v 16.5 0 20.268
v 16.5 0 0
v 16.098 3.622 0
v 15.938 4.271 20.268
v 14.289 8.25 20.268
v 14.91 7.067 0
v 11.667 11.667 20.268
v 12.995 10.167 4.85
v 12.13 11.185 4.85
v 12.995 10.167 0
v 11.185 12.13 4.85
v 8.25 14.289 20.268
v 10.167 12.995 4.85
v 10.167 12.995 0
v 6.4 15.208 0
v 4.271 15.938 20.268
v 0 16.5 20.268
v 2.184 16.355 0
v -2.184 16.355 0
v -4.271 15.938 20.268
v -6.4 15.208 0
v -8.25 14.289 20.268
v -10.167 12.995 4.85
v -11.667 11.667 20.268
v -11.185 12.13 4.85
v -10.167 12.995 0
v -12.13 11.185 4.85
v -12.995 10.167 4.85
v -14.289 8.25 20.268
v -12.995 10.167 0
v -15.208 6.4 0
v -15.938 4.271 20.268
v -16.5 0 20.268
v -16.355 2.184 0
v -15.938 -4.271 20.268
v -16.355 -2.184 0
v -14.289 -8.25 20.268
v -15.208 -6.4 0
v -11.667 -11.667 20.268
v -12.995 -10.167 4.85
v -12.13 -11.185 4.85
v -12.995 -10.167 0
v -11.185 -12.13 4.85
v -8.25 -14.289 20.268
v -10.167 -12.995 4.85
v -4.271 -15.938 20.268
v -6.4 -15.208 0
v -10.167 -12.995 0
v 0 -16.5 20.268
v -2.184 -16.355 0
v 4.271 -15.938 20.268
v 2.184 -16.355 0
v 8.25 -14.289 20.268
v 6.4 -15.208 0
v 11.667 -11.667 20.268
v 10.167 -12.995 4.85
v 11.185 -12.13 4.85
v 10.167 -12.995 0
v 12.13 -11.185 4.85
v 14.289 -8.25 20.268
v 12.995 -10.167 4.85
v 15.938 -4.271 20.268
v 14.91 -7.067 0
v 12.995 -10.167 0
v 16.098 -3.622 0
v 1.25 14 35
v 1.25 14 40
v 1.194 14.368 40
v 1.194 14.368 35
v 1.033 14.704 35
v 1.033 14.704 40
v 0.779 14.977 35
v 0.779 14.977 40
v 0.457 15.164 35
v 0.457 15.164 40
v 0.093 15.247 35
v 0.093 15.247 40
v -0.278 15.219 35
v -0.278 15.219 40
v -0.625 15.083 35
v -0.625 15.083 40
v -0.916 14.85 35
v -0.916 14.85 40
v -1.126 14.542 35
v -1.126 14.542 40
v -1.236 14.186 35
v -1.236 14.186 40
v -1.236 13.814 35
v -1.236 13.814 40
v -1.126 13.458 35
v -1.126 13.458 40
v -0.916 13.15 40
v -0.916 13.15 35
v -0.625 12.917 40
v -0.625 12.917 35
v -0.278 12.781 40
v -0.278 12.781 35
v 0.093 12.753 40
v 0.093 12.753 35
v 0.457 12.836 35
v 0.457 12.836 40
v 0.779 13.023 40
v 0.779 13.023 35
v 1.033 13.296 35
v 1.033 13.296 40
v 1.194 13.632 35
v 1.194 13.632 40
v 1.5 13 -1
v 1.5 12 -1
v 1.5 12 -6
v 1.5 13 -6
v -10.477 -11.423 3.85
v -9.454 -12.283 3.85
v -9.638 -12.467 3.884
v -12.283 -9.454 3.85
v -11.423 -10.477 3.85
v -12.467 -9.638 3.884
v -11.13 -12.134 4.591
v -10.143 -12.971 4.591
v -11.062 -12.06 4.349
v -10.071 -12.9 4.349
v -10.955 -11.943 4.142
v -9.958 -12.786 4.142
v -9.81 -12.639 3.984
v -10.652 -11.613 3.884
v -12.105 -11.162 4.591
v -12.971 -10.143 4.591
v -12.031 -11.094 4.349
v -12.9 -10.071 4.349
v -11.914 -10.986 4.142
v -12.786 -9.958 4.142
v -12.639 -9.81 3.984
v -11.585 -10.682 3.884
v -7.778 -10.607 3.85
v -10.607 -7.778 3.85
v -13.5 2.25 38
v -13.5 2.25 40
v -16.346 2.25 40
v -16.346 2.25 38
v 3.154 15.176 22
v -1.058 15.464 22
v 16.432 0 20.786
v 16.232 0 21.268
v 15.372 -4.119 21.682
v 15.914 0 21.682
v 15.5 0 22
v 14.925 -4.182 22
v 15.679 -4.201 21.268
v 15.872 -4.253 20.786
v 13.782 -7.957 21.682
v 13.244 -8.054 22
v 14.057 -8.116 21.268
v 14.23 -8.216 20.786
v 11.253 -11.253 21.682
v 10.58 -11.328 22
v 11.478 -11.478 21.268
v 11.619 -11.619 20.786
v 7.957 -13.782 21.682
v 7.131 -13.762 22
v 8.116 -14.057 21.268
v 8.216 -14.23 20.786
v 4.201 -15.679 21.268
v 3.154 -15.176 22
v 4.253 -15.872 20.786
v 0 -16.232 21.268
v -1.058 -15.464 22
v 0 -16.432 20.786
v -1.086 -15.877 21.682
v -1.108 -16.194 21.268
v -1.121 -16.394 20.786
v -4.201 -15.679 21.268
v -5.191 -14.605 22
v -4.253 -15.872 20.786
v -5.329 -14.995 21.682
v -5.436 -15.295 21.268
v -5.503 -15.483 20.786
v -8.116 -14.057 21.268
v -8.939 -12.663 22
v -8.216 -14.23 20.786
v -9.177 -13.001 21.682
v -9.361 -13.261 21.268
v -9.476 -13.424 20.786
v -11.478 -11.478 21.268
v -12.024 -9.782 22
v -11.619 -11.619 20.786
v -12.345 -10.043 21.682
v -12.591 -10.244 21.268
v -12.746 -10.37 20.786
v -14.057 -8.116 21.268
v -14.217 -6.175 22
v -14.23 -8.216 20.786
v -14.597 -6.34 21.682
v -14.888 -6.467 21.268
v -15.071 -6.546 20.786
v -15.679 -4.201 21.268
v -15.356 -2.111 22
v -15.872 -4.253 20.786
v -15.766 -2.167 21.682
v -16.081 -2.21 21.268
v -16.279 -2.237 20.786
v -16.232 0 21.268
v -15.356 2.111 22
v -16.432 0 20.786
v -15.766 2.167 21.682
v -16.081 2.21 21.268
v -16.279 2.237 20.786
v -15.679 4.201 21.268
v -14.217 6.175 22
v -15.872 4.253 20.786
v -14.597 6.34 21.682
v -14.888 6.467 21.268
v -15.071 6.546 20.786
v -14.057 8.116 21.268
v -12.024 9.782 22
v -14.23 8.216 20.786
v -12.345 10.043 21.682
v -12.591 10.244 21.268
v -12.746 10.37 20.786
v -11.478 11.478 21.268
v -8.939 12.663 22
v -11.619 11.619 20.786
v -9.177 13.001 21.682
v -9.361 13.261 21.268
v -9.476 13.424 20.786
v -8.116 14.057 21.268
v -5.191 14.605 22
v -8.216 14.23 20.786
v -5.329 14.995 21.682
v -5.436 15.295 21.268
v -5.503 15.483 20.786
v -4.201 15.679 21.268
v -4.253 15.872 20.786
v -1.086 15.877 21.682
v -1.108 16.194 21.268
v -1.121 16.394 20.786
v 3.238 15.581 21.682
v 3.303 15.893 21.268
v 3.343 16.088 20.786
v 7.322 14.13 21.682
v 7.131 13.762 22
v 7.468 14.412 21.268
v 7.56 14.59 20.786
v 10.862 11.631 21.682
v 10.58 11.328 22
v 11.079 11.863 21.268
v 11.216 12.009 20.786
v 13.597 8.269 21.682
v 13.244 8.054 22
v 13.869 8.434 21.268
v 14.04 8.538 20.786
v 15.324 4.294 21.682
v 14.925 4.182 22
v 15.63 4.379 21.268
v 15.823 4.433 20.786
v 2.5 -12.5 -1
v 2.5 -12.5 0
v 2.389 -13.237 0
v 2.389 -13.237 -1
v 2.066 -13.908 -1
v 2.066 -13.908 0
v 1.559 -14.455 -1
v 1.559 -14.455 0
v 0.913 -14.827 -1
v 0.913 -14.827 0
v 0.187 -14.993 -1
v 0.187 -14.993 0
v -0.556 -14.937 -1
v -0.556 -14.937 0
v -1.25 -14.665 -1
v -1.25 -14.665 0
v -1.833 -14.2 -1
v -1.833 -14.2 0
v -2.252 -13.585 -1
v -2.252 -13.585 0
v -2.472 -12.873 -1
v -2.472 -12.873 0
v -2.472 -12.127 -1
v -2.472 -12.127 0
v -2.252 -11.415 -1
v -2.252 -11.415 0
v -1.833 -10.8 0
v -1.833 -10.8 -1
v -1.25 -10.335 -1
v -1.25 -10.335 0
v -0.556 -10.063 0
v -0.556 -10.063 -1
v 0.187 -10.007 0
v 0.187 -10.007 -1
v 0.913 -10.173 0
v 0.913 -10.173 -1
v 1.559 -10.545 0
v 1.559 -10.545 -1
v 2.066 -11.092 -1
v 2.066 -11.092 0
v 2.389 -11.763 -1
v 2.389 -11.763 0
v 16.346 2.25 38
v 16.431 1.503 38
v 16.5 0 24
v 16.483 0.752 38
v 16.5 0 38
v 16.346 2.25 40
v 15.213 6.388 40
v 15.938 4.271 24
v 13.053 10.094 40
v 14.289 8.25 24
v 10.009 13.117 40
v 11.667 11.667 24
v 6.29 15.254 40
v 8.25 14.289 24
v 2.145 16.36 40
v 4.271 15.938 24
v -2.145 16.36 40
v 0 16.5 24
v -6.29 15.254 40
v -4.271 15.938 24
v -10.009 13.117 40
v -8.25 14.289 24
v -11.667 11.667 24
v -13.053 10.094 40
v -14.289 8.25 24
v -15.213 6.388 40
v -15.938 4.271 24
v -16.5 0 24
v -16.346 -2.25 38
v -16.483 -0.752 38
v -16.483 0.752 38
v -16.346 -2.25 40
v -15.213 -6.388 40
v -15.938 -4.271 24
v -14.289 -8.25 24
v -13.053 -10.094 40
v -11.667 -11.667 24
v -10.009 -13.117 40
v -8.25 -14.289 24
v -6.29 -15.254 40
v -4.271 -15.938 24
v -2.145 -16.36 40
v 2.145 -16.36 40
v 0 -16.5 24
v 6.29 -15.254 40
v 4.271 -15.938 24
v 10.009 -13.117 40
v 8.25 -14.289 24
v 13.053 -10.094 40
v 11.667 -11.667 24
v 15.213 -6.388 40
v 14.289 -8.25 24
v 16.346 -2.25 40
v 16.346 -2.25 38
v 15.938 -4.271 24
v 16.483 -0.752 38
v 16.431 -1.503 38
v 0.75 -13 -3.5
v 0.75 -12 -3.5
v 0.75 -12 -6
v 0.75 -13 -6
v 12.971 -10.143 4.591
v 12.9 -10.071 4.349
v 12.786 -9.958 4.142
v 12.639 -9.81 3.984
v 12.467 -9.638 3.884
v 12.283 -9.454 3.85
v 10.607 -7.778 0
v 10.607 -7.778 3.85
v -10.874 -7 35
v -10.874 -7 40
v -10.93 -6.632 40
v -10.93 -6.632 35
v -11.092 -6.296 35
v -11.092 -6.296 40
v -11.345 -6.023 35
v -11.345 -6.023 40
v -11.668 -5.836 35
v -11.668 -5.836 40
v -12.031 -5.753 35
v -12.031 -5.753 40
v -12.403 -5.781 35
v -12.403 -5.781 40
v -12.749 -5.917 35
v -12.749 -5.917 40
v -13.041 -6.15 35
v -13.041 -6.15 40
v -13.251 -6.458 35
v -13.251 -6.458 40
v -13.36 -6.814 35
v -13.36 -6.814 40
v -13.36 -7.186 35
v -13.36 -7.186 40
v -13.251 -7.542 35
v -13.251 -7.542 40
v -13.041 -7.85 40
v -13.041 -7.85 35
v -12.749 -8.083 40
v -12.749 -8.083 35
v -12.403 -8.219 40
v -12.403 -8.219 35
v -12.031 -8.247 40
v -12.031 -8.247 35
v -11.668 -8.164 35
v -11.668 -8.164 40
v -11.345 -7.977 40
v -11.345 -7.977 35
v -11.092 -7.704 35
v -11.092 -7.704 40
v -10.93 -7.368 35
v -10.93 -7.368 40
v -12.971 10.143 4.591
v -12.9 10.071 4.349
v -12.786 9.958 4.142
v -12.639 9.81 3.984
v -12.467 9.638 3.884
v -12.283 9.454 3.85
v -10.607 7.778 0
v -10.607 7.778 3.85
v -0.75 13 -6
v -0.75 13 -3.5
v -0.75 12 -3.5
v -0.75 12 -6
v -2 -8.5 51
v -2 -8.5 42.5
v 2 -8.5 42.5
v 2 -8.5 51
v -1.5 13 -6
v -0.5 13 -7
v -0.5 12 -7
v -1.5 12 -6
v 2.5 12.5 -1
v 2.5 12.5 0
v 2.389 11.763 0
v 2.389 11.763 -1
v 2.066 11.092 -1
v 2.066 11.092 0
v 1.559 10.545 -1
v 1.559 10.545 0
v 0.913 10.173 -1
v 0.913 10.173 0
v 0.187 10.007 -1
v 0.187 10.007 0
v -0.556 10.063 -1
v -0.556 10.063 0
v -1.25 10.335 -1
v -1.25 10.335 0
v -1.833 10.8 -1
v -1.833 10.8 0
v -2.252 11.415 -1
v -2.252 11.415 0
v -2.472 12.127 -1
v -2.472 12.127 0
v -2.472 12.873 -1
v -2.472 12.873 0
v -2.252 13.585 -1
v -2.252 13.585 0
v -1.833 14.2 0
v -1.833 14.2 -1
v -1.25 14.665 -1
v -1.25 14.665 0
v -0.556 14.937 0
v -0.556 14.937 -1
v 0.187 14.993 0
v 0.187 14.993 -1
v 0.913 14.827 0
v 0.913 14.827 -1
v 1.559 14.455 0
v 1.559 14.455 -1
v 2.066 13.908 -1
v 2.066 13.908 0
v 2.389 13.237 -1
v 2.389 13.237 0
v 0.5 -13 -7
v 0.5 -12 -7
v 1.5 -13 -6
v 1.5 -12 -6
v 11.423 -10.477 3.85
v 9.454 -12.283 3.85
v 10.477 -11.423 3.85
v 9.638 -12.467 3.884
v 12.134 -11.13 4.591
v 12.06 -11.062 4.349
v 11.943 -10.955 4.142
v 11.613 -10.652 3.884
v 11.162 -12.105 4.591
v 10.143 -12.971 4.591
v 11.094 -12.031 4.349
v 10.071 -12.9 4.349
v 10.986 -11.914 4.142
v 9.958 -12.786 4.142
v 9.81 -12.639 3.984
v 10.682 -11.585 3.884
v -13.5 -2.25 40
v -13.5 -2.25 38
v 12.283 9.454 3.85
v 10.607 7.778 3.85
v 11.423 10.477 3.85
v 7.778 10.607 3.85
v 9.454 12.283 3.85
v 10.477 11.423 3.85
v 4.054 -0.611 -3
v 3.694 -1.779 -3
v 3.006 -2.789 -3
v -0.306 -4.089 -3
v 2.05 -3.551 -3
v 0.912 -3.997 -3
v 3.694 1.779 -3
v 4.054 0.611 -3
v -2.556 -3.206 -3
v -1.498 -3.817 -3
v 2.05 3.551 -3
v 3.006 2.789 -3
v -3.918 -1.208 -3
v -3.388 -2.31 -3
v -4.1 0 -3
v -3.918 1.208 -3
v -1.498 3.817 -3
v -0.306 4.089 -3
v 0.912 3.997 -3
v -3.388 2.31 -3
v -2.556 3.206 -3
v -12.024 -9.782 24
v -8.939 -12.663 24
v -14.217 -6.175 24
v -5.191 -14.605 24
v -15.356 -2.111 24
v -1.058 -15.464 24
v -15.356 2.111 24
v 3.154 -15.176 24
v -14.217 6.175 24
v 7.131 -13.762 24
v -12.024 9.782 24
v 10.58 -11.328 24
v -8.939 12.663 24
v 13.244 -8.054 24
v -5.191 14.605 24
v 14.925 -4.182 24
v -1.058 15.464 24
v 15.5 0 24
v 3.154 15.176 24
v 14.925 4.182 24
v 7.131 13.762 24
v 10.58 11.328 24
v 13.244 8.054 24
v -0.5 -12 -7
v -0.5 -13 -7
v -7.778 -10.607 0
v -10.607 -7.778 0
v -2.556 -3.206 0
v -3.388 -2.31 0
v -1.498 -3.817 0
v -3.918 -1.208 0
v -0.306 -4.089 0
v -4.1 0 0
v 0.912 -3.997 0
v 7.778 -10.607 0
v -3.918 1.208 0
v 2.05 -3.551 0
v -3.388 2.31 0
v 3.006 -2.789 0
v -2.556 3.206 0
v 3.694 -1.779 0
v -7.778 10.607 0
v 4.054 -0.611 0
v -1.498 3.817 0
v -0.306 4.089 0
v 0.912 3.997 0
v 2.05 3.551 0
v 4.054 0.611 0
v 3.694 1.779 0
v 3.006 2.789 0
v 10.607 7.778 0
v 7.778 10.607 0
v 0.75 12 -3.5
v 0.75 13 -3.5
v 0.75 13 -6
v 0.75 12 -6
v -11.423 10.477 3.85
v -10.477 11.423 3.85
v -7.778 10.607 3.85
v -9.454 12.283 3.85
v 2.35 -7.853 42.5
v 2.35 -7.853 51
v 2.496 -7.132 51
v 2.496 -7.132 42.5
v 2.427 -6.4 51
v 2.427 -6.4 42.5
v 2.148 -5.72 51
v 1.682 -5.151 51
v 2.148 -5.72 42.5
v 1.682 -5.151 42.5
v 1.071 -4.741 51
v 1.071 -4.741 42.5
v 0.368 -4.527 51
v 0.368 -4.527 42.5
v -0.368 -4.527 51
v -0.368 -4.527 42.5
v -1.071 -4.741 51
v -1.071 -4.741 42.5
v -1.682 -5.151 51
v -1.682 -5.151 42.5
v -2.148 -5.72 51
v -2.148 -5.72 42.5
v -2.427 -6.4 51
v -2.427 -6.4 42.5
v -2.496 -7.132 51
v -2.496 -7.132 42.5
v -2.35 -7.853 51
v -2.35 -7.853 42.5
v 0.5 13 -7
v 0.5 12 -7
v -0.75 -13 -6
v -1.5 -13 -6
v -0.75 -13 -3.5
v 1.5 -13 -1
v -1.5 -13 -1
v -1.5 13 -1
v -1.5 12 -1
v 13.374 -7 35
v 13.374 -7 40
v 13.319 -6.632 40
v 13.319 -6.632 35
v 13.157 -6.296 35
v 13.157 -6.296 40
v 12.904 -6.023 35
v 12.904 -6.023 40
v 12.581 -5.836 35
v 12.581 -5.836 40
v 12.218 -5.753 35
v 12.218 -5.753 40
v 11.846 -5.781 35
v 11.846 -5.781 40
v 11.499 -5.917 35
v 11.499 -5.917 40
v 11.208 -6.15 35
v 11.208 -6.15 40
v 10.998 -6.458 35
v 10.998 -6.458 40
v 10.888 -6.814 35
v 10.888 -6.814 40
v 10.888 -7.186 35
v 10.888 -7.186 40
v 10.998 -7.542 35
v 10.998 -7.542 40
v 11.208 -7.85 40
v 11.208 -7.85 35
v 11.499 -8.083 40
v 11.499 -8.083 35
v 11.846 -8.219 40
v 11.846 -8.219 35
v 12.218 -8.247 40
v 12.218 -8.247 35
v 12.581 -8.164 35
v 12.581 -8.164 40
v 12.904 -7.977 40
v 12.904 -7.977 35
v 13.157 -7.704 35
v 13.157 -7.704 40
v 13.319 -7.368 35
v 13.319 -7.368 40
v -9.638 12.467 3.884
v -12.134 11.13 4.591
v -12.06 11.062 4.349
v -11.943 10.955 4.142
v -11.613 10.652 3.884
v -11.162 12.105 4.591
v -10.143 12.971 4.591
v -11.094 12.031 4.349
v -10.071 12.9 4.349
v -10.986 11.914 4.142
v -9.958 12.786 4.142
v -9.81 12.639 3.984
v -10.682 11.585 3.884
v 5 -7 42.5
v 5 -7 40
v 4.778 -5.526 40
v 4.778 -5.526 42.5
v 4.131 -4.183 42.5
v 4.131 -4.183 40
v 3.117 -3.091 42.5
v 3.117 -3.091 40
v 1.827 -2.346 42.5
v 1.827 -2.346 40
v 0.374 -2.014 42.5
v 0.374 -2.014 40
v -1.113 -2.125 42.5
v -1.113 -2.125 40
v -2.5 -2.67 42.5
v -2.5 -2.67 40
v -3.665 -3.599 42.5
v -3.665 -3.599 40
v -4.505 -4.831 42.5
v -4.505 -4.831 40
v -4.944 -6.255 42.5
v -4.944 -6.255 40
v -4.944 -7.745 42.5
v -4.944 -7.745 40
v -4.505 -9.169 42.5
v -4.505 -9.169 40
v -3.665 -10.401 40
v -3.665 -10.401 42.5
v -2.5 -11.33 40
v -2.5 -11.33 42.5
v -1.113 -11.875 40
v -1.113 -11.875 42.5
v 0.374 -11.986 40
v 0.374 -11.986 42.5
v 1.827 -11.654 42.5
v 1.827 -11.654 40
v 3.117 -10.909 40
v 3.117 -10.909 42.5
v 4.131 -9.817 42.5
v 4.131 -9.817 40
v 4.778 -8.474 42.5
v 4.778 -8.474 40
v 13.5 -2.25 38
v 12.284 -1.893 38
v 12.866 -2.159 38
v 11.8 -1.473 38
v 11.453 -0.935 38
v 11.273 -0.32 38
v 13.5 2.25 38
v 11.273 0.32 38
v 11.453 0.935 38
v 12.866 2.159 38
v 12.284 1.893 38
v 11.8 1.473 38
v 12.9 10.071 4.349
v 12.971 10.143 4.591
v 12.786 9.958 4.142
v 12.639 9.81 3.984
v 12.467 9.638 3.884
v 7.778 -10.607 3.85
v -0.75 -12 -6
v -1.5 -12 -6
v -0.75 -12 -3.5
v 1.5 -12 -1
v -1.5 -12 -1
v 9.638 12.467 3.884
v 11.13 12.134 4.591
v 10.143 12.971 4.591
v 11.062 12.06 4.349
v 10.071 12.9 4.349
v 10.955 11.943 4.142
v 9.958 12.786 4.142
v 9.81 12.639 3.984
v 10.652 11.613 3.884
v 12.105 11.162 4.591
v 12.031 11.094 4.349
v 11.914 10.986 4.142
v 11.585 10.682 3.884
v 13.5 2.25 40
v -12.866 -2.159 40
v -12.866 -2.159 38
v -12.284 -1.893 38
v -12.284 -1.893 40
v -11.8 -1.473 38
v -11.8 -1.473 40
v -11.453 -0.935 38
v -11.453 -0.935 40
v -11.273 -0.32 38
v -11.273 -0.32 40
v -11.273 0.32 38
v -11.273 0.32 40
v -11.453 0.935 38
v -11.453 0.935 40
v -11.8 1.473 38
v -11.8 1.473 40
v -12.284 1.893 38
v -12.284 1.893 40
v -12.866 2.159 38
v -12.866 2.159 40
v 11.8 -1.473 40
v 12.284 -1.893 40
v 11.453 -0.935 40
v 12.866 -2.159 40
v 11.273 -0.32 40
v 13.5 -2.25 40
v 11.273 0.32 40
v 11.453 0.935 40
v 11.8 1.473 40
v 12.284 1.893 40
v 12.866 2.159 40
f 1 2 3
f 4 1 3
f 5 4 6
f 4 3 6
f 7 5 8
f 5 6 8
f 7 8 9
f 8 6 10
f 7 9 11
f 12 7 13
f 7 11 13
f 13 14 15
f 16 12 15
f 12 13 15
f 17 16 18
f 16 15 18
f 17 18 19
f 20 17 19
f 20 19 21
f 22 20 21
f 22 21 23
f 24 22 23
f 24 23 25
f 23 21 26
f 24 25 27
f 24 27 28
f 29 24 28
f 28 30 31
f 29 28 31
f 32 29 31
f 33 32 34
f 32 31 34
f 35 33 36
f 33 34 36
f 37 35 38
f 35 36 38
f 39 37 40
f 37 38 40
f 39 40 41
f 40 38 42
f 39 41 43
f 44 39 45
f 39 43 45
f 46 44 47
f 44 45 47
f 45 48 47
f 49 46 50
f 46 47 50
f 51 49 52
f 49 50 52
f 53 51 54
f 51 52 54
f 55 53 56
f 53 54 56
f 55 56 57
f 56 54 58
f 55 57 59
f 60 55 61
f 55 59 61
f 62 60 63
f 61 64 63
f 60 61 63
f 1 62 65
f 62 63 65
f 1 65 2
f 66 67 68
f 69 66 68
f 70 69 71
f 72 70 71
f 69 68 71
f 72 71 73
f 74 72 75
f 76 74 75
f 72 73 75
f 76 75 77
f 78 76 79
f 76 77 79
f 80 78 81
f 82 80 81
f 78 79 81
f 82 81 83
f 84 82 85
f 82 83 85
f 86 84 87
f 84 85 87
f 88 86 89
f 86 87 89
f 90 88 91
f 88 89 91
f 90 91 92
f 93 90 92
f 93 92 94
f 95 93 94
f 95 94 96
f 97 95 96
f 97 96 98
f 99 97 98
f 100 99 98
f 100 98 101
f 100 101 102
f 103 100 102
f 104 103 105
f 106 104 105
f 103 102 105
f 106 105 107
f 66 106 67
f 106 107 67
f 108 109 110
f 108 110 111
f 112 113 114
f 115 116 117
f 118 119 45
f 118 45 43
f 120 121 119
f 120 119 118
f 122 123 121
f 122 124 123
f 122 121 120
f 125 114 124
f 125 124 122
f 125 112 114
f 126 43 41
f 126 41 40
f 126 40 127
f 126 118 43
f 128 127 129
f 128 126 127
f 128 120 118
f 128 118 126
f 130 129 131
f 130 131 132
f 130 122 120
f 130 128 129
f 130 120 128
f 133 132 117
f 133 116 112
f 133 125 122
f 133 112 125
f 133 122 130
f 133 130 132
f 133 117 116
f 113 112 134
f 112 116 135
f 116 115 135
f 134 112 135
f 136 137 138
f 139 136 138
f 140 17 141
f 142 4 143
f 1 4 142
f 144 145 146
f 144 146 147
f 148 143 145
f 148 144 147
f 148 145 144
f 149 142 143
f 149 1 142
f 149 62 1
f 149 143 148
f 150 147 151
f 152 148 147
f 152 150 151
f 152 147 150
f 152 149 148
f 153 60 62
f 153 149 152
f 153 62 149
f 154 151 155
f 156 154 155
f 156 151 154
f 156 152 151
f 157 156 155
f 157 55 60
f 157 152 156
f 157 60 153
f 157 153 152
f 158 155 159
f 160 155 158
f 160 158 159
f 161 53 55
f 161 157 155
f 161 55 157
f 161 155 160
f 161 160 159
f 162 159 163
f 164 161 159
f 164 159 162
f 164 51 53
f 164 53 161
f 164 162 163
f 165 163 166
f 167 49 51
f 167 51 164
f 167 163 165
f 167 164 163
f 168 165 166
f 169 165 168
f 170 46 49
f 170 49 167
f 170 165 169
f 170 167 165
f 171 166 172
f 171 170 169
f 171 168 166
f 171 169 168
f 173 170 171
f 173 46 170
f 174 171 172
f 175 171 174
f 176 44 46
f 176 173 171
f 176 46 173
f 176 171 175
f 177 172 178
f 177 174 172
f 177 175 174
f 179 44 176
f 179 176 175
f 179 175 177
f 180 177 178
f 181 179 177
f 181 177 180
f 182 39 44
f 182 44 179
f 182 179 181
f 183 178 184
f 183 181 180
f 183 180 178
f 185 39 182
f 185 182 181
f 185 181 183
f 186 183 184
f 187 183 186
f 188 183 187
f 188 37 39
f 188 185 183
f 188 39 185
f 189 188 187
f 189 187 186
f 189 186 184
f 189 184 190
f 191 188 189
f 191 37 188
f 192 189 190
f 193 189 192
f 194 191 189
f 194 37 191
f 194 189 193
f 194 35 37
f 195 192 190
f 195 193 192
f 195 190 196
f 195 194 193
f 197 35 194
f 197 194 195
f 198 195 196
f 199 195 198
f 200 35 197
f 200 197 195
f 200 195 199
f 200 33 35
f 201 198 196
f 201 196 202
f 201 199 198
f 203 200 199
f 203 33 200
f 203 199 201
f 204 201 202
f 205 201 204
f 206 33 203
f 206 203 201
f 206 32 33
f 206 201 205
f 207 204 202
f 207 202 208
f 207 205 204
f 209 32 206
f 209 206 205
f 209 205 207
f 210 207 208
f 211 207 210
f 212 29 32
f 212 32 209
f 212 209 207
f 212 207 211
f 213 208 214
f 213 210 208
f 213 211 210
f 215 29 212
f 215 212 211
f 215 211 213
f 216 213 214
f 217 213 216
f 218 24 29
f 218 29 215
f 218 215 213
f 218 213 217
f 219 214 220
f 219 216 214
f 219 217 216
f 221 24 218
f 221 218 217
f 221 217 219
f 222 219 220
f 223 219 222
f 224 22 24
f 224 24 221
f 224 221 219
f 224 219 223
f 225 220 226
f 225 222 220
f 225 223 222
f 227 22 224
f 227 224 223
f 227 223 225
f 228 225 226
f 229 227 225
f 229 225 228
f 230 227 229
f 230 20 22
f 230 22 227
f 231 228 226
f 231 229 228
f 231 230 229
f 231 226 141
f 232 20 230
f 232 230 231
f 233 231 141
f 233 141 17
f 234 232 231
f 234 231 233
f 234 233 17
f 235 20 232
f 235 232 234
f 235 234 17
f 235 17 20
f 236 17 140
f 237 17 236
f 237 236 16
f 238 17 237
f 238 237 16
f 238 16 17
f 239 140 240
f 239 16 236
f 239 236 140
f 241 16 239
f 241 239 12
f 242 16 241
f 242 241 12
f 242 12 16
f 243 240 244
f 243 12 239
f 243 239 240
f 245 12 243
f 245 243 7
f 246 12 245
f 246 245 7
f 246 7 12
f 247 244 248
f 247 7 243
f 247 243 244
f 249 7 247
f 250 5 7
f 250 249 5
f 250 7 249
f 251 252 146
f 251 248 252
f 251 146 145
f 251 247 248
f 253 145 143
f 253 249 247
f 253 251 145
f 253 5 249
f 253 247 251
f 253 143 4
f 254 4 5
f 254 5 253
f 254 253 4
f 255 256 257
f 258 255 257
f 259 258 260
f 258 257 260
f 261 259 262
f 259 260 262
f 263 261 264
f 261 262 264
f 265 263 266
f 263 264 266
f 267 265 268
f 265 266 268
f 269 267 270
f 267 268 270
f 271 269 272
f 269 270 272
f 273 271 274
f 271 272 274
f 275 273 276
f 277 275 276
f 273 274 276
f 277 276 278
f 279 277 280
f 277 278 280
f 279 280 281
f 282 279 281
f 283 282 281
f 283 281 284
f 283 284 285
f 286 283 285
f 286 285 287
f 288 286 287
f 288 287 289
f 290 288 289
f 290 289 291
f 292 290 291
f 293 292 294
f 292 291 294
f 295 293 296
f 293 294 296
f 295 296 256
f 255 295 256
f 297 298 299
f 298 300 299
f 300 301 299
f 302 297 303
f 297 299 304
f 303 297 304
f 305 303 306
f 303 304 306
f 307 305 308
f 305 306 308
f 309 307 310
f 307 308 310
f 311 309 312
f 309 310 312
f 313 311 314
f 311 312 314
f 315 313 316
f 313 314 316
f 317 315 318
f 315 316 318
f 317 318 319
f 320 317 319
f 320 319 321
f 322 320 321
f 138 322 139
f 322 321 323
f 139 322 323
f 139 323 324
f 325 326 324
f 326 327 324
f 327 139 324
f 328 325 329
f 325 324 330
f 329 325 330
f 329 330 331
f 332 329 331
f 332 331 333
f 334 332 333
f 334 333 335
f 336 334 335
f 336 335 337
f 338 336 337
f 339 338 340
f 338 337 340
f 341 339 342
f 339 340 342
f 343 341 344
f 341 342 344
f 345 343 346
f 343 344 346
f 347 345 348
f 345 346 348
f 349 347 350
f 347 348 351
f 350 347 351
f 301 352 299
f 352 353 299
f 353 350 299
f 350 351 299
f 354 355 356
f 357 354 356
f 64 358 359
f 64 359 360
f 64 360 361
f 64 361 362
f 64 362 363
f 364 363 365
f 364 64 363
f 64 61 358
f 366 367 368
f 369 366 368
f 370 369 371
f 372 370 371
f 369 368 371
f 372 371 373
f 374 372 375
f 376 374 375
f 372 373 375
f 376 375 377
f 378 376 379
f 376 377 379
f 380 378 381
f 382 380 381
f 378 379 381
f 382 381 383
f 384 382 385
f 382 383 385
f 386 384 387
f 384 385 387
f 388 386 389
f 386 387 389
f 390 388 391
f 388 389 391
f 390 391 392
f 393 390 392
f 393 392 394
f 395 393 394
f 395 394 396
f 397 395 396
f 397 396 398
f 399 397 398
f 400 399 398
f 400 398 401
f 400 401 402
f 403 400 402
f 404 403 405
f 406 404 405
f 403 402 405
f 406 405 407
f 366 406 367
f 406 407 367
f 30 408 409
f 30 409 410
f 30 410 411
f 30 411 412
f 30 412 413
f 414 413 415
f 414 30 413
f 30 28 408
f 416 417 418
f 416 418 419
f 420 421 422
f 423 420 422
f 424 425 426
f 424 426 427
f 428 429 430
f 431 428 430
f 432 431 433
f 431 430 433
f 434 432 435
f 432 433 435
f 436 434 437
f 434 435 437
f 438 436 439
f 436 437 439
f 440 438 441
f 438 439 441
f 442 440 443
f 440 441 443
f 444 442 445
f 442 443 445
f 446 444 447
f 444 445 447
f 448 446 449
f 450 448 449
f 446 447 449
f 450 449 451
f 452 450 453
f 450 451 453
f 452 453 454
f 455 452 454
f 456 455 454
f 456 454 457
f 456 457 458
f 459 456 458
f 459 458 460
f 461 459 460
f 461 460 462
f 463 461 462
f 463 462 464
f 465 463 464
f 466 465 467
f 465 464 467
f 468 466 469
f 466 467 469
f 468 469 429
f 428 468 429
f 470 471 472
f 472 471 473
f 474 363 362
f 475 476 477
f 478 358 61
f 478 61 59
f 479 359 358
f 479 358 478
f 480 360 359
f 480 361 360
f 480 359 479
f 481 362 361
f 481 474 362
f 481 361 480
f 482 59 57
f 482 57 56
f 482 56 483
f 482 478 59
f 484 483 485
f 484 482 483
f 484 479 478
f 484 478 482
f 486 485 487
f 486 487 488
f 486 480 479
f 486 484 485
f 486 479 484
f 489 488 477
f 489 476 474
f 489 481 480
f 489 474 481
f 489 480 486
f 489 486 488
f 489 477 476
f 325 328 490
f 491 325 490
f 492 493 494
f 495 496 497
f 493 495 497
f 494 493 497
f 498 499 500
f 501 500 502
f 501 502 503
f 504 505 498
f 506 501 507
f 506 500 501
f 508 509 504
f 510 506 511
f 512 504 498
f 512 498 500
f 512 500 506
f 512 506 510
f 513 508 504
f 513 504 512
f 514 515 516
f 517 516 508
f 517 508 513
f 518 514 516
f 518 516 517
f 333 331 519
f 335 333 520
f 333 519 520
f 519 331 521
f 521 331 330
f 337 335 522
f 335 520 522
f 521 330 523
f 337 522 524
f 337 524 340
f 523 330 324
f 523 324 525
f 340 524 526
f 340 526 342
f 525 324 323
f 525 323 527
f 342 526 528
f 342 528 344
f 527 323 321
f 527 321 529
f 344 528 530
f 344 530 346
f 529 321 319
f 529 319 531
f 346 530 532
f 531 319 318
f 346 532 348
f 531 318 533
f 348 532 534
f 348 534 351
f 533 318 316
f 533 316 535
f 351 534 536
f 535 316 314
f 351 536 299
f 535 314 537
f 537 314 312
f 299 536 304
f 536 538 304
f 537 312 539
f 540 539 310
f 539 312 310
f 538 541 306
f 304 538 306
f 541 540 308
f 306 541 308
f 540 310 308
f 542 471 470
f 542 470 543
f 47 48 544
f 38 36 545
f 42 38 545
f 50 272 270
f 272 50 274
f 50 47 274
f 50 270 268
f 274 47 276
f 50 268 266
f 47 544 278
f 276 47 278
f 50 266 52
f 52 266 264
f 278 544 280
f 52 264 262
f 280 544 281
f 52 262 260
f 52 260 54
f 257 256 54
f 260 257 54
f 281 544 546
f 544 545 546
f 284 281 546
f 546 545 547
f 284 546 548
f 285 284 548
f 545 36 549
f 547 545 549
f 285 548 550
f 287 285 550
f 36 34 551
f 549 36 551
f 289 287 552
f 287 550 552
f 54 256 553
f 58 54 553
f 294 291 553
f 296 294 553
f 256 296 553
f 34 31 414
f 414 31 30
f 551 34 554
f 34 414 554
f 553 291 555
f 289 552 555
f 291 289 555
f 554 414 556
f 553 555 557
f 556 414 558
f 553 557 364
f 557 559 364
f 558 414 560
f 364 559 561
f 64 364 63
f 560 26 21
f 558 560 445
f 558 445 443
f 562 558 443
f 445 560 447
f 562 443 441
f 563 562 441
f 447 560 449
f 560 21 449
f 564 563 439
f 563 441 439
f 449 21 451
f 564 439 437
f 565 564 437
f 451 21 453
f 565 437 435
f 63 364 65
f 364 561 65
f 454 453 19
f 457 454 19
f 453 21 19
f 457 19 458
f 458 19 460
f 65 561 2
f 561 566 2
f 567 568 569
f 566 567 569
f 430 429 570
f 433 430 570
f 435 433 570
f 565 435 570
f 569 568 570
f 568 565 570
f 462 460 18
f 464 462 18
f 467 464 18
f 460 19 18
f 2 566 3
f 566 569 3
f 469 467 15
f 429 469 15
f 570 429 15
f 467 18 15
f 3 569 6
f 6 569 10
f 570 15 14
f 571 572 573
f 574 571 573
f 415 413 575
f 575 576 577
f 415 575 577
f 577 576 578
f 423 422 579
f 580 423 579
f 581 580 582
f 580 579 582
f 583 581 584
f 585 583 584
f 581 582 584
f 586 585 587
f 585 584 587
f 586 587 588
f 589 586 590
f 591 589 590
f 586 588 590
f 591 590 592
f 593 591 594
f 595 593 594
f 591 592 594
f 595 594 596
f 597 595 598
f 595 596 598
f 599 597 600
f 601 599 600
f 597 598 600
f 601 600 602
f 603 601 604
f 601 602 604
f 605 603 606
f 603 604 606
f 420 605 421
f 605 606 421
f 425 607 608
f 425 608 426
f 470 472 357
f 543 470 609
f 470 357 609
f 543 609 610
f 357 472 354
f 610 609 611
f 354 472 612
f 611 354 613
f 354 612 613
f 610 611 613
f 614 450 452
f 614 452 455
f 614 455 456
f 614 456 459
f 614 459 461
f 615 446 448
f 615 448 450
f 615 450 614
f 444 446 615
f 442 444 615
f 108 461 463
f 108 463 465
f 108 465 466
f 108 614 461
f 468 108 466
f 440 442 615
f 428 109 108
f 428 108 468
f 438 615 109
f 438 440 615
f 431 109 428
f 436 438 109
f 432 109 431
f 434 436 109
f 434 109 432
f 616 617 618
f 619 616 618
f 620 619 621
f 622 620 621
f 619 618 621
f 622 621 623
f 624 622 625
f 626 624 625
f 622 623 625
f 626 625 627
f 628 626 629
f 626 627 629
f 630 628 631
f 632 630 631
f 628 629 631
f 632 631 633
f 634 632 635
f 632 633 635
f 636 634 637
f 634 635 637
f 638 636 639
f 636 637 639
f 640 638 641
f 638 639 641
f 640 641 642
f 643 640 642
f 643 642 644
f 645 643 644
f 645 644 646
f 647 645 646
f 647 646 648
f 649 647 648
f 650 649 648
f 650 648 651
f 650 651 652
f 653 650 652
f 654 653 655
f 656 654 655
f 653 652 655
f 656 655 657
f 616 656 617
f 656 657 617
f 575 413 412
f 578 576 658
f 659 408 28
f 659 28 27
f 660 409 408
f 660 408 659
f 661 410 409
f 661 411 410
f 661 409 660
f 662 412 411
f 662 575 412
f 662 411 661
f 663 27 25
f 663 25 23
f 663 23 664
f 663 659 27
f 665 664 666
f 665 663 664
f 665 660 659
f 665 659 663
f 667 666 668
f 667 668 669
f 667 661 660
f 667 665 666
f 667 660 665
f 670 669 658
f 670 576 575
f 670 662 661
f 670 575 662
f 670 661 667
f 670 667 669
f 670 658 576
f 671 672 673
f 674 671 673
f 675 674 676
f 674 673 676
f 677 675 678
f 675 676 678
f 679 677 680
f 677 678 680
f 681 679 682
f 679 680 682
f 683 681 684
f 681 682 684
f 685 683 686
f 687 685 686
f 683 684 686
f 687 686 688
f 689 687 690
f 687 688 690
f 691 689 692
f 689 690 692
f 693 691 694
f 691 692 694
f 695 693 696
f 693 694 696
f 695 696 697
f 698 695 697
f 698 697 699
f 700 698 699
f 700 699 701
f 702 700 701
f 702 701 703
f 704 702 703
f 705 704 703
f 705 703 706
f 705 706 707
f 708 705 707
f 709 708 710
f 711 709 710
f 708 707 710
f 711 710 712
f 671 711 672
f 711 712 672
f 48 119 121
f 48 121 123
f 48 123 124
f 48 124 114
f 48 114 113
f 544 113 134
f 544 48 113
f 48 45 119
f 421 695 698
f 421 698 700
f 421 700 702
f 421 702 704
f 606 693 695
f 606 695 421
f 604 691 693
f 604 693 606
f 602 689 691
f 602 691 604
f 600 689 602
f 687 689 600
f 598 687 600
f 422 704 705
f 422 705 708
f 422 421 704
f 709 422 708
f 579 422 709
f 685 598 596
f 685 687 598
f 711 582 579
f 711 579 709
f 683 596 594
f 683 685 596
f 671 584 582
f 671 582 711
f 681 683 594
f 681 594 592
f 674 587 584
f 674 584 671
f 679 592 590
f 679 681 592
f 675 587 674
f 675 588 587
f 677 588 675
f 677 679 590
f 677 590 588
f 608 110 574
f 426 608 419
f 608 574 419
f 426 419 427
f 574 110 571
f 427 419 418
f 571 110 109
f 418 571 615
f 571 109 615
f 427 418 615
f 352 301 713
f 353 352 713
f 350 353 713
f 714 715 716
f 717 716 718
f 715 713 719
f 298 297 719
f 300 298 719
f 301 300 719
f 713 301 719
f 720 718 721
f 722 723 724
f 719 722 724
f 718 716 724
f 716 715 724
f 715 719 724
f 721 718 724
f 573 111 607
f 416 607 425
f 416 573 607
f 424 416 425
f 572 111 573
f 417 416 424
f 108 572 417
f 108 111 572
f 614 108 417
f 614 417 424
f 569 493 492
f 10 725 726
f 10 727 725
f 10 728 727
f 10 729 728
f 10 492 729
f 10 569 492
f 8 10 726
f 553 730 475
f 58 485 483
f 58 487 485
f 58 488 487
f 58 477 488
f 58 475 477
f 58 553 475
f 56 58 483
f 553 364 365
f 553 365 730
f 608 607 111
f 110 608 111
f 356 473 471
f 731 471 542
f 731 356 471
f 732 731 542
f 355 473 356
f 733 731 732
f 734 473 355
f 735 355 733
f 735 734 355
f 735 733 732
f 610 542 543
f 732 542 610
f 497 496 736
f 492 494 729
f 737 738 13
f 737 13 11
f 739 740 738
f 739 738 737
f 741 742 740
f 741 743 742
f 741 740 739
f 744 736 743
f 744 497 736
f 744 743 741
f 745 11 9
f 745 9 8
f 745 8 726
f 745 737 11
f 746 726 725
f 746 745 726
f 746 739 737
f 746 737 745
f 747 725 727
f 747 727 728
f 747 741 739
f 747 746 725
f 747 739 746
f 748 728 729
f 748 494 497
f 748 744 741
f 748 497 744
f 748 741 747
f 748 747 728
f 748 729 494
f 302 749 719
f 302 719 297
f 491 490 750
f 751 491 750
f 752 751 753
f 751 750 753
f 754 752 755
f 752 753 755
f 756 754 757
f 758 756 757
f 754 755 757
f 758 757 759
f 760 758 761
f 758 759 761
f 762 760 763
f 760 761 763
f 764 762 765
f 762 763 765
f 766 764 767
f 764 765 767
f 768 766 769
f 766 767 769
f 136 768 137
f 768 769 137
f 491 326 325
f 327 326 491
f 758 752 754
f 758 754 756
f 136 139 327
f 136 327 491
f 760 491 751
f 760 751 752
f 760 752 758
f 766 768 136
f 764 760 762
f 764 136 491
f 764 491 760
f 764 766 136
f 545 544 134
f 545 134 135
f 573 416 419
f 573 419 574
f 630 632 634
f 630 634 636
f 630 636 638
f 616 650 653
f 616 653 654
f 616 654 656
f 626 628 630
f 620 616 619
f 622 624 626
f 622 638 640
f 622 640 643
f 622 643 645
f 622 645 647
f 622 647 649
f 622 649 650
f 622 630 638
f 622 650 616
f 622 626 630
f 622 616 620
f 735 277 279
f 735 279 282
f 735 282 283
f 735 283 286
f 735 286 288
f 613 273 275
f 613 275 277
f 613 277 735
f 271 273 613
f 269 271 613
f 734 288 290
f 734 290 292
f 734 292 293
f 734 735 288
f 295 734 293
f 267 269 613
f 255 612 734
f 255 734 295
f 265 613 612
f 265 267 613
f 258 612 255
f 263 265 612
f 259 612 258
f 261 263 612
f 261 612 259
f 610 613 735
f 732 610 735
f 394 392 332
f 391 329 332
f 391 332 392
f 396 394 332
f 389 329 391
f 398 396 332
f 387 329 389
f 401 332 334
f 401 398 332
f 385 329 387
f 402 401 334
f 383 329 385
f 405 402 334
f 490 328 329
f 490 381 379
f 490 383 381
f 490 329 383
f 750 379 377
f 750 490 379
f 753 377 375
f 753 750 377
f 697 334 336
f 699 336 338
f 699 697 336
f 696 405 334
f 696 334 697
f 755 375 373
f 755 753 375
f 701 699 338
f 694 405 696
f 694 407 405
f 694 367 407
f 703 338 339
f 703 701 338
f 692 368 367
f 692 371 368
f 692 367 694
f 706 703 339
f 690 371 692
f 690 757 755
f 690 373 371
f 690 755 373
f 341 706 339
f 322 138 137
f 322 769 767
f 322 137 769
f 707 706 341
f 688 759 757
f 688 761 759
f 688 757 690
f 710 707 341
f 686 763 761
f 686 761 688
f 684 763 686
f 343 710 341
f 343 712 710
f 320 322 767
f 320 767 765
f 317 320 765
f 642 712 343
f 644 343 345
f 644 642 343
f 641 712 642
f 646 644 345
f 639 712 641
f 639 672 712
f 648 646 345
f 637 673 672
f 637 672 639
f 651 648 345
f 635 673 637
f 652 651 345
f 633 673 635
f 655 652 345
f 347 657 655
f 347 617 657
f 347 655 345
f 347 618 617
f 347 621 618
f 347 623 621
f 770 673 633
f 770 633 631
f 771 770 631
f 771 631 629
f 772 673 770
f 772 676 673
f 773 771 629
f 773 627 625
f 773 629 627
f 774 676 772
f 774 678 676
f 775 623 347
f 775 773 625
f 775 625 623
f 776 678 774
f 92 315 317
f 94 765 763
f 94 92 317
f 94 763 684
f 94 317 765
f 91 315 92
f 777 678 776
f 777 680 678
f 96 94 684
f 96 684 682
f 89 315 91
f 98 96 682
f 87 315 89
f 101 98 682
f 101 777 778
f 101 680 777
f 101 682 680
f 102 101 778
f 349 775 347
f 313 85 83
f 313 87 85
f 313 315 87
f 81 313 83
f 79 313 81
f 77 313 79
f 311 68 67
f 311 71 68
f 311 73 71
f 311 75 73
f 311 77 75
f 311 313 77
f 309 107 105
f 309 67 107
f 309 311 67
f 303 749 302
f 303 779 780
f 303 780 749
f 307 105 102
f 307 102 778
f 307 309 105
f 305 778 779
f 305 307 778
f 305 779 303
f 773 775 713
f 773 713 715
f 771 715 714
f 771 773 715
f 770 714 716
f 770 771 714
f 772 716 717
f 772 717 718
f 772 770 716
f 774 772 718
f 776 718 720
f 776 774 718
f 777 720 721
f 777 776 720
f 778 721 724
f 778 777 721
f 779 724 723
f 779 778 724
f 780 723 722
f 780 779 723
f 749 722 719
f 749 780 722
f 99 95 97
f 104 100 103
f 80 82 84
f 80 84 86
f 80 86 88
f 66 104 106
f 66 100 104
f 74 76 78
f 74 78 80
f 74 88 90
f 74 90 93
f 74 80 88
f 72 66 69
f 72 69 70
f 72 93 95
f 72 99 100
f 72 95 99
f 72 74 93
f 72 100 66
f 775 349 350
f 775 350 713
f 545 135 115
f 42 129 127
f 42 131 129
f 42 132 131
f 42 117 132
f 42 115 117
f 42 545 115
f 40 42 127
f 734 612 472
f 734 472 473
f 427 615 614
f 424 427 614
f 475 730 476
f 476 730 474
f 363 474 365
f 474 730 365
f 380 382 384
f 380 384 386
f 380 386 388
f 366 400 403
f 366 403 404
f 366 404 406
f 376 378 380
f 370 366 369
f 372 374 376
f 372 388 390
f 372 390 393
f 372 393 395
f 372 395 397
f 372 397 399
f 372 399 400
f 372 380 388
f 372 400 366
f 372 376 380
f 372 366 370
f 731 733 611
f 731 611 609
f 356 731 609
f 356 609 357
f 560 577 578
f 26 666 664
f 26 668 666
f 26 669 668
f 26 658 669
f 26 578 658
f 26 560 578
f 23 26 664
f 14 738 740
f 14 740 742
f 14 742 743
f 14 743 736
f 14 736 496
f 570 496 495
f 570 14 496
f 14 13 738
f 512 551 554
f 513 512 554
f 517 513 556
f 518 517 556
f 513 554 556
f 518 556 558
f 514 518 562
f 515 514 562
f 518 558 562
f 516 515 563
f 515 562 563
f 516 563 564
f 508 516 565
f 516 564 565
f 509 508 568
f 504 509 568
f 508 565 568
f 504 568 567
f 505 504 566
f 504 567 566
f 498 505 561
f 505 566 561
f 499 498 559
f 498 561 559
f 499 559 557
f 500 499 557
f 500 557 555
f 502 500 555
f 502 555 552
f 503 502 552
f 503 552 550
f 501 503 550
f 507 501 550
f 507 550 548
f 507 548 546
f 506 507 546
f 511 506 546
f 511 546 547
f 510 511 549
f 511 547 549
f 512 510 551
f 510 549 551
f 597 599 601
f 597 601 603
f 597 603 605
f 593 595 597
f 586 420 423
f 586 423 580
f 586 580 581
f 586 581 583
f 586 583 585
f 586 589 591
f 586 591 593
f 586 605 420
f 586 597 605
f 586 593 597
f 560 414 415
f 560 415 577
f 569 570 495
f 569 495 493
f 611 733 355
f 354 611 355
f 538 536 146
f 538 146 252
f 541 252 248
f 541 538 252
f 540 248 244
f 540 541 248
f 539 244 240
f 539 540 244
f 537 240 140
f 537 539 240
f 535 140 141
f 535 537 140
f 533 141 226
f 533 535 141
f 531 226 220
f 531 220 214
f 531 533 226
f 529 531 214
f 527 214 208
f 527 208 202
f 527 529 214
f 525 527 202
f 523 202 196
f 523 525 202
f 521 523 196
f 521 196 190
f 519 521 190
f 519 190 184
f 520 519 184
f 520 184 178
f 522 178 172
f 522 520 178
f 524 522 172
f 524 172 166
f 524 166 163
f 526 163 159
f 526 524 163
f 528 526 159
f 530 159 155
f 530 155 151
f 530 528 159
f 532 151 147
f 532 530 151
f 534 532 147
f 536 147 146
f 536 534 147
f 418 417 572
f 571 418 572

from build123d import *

# Parameters (mm, degrees)
SKETCH1_R           = 16.5
BOSS_EXTRUDE1_DEPTH = 40
SKETCH2_R           = 1.25
CUT_EXTRUDE1_DEPTH  = 5
SKETCH3_R           = 5
BOSS_EXTRUDE2_DEPTH = 2.5
BOSS_EXTRUDE3_DEPTH = 8.5
CUT_EXTRUDE2_DEPTH  = 2
CUT_EXTRUDE3_START  = -16
SKETCH6_R           = 17.194108904
SKETCH6_R_2         = 15.5
CUT_EXTRUDE3_DEPTH  = 2
FILLET1_R           = 2
SKETCH7_R           = 4.1
BOSS_EXTRUDE4_DEPTH = 3
SKETCH8_R           = 2.5
BOSS_EXTRUDE5_DEPTH = 1
SKETCH9_W           = 3
SKETCH9_H           = 1
BOSS_EXTRUDE6_DEPTH = 6
CUT_EXTRUDE4_DEPTH  = 62.184148274
SKETCH11_W          = 1.5
SKETCH11_H          = 2.5
CUT_EXTRUDE5_DEPTH  = 62.184148274
CUT_EXTRUDE6_DEPTH  = 3.85
FILLET2_R           = 1


with BuildPart() as part:
    # Sketch1 → Boss-Extrude1 (new body)
    with BuildSketch(Plane.XY):
        Circle(SKETCH1_R)
    extrude(amount=BOSS_EXTRUDE1_DEPTH)

    # Sketch2 → Cut-Extrude1 (cut)
    with BuildSketch(Plane.XY.offset(40)):
        with Locations((0, 14)):
            Circle(SKETCH2_R)
        with Locations((12.124355653, -7)):
            Circle(SKETCH2_R)
        with Locations((-12.124355653, -7)):
            Circle(SKETCH2_R)
    extrude(amount=-CUT_EXTRUDE1_DEPTH, mode=Mode.SUBTRACT)

    # Sketch3 → Boss-Extrude2 (add)
    with BuildSketch(Plane.XY.offset(40)):
        with Locations((0, -7)):
            Circle(SKETCH3_R)
    extrude(amount=BOSS_EXTRUDE2_DEPTH)

    # Sketch4 → Boss-Extrude3 (add)
    with BuildSketch(Plane.XY.offset(42.5)):
        with BuildLine():
            Line((-2, -8.5), (2, -8.5))
            ThreePointArc((2, -8.5), (0, -4.5), (-2, -8.5))
        make_face()
    extrude(amount=BOSS_EXTRUDE3_DEPTH)

    # Sketch5 → Cut-Extrude2 (cut)
    with BuildSketch(Plane.XY.offset(40)):
        with BuildLine():
            Line((-13.5, 2.25), (-17.622574656, 2.25))
            Line((-17.622574656, 2.25), (-17.622574656, -2.25))
            Line((-17.622574656, -2.25), (-13.5, -2.25))
            ThreePointArc((-13.5, -2.25), (-11.25, 0), (-13.5, 2.25))
        make_face()
        with BuildLine():
            Line((17.622574656, -2.25), (13.5, -2.25))
            ThreePointArc((13.5, -2.25), (11.25, 0), (13.5, 2.25))
            Line((13.5, 2.25), (17.622574656, 2.25))
            Line((17.622574656, 2.25), (17.622574656, -2.25))
        make_face()
    extrude(amount=-CUT_EXTRUDE2_DEPTH, mode=Mode.SUBTRACT)

    # Sketch6 → Cut-Extrude3 (cut)
    with BuildSketch(Plane.XY.offset(40).offset(CUT_EXTRUDE3_START)):
        Circle(SKETCH6_R)
        Circle(SKETCH6_R_2, mode=Mode.SUBTRACT)
    extrude(amount=-CUT_EXTRUDE3_DEPTH, mode=Mode.SUBTRACT)

    # Fillet1
    # the kernel refuses this fillet: 2 mm, written as the material it takes off along each edge
    with BuildSketch(Plane(origin=(0, 0, 22), x_dir=(1, 0, 0), z_dir=(0, 1, 0))) as fillet1_piece_1:
        with BuildLine():
            CenterArc((14.5, 1.732050808), FILLET1_R, 300, 60)
            Line((15.5, 0), (15.52, -0.034641016))
            ThreePointArc((15.52, -0.034641016), (16, -0.04), (16.5, -0.04))
            Line((16.5, -0.04), (16.54, 0))
            Line((16.54, 0), (16.54, 1.732050808))
            Line((16.54, 1.732050808), (16.5, 1.732050808))
        make_face()
    revolve(axis=Axis((0, 0, 22), (0, 0, -1)), mode=Mode.SUBTRACT)

    # Sketch7 → Boss-Extrude4 (add)
    with BuildSketch(Plane(origin=(0, 0, 0), x_dir=(-1, 0, 0), z_dir=(0, 0, -1))):
        Circle(SKETCH7_R)
    extrude(amount=BOSS_EXTRUDE4_DEPTH)

    # Sketch8 → Boss-Extrude5 (add)
    with BuildSketch(Plane(origin=(0, 0, 0), x_dir=(-1, 0, 0), z_dir=(0, 0, -1))):
        with Locations(Location((0, 12.5, 0), (0, 0, 180))):
            Circle(SKETCH8_R)
        with Locations(Location((0, -12.5, 0), (0, 0, 180))):
            Circle(SKETCH8_R)
    extrude(amount=BOSS_EXTRUDE5_DEPTH)

    # Sketch9 → Boss-Extrude6 (add)
    with BuildSketch(Plane(origin=(0, 0, -1), x_dir=(-1, 0, 0), z_dir=(0, 0, -1))):
        with Locations((0, -12.5)):
            Rectangle(SKETCH9_W, SKETCH9_H)
        with Locations((0, 12.5)):
            Rectangle(SKETCH9_W, SKETCH9_H)
    extrude(amount=BOSS_EXTRUDE6_DEPTH)

    # Sketch10 → Cut-Extrude4 (cut, through all)
    with BuildSketch(Plane(origin=(0, 13, 0), x_dir=(1, 0, 0), z_dir=(0, 1, 0))):
        Polygon((-1.5, 7), (-0.5, 7), (-1.5, 6), align=None)
        Polygon((1.5, 7), (0.5, 7), (1.5, 6), align=None)
    extrude(amount=-CUT_EXTRUDE4_DEPTH, mode=Mode.SUBTRACT)

    # Sketch11 → Cut-Extrude5 (cut, through all)
    with BuildSketch(Plane(origin=(0, 13, 0), x_dir=(1, 0, 0), z_dir=(0, 1, 0))):
        with Locations((0, 4.75)):
            Rectangle(SKETCH11_W, SKETCH11_H)
    extrude(amount=-CUT_EXTRUDE5_DEPTH, mode=Mode.SUBTRACT)

    # Sketch12 → Cut-Extrude6 (cut)
    with BuildSketch(Plane(origin=(0, 0, 0), x_dir=(-1, 0, 0), z_dir=(0, 0, -1))):
        Polygon((7.778174593, 10.606601718), (11.692726543, 14.521153668), (14.527839542, 11.699412418), (10.606601718, 7.778174593), align=None)
        Polygon((10.606601718, -7.778174593), (14.521153668, -11.692726543), (11.699412418, -14.527839542), (7.778174593, -10.606601718), align=None)
        Polygon((-7.778174593, -10.606601718), (-11.692726543, -14.521153668), (-14.527839542, -11.699412418), (-10.606601718, -7.778174593), align=None)
        Polygon((-10.606601718, 7.778174593), (-14.521153668, 11.692726543), (-11.699412418, 14.527839542), (-7.778174593, 10.606601718), align=None)
    extrude(amount=-CUT_EXTRUDE6_DEPTH, mode=Mode.SUBTRACT)

    # Fillet2
    fillet2_edges = [part.edges().sort_by_distance(p)[0] for p in [
        (-11.66726189, 11.66726189, 3.85),
        (-11.66726189, -11.66726189, 3.85),
        (11.66726189, -11.66726189, 3.85),
        (11.66726189, 11.66726189, 3.85),
    ]]
    fillet(fillet2_edges, radius=FILLET2_R)


solid = part.part
